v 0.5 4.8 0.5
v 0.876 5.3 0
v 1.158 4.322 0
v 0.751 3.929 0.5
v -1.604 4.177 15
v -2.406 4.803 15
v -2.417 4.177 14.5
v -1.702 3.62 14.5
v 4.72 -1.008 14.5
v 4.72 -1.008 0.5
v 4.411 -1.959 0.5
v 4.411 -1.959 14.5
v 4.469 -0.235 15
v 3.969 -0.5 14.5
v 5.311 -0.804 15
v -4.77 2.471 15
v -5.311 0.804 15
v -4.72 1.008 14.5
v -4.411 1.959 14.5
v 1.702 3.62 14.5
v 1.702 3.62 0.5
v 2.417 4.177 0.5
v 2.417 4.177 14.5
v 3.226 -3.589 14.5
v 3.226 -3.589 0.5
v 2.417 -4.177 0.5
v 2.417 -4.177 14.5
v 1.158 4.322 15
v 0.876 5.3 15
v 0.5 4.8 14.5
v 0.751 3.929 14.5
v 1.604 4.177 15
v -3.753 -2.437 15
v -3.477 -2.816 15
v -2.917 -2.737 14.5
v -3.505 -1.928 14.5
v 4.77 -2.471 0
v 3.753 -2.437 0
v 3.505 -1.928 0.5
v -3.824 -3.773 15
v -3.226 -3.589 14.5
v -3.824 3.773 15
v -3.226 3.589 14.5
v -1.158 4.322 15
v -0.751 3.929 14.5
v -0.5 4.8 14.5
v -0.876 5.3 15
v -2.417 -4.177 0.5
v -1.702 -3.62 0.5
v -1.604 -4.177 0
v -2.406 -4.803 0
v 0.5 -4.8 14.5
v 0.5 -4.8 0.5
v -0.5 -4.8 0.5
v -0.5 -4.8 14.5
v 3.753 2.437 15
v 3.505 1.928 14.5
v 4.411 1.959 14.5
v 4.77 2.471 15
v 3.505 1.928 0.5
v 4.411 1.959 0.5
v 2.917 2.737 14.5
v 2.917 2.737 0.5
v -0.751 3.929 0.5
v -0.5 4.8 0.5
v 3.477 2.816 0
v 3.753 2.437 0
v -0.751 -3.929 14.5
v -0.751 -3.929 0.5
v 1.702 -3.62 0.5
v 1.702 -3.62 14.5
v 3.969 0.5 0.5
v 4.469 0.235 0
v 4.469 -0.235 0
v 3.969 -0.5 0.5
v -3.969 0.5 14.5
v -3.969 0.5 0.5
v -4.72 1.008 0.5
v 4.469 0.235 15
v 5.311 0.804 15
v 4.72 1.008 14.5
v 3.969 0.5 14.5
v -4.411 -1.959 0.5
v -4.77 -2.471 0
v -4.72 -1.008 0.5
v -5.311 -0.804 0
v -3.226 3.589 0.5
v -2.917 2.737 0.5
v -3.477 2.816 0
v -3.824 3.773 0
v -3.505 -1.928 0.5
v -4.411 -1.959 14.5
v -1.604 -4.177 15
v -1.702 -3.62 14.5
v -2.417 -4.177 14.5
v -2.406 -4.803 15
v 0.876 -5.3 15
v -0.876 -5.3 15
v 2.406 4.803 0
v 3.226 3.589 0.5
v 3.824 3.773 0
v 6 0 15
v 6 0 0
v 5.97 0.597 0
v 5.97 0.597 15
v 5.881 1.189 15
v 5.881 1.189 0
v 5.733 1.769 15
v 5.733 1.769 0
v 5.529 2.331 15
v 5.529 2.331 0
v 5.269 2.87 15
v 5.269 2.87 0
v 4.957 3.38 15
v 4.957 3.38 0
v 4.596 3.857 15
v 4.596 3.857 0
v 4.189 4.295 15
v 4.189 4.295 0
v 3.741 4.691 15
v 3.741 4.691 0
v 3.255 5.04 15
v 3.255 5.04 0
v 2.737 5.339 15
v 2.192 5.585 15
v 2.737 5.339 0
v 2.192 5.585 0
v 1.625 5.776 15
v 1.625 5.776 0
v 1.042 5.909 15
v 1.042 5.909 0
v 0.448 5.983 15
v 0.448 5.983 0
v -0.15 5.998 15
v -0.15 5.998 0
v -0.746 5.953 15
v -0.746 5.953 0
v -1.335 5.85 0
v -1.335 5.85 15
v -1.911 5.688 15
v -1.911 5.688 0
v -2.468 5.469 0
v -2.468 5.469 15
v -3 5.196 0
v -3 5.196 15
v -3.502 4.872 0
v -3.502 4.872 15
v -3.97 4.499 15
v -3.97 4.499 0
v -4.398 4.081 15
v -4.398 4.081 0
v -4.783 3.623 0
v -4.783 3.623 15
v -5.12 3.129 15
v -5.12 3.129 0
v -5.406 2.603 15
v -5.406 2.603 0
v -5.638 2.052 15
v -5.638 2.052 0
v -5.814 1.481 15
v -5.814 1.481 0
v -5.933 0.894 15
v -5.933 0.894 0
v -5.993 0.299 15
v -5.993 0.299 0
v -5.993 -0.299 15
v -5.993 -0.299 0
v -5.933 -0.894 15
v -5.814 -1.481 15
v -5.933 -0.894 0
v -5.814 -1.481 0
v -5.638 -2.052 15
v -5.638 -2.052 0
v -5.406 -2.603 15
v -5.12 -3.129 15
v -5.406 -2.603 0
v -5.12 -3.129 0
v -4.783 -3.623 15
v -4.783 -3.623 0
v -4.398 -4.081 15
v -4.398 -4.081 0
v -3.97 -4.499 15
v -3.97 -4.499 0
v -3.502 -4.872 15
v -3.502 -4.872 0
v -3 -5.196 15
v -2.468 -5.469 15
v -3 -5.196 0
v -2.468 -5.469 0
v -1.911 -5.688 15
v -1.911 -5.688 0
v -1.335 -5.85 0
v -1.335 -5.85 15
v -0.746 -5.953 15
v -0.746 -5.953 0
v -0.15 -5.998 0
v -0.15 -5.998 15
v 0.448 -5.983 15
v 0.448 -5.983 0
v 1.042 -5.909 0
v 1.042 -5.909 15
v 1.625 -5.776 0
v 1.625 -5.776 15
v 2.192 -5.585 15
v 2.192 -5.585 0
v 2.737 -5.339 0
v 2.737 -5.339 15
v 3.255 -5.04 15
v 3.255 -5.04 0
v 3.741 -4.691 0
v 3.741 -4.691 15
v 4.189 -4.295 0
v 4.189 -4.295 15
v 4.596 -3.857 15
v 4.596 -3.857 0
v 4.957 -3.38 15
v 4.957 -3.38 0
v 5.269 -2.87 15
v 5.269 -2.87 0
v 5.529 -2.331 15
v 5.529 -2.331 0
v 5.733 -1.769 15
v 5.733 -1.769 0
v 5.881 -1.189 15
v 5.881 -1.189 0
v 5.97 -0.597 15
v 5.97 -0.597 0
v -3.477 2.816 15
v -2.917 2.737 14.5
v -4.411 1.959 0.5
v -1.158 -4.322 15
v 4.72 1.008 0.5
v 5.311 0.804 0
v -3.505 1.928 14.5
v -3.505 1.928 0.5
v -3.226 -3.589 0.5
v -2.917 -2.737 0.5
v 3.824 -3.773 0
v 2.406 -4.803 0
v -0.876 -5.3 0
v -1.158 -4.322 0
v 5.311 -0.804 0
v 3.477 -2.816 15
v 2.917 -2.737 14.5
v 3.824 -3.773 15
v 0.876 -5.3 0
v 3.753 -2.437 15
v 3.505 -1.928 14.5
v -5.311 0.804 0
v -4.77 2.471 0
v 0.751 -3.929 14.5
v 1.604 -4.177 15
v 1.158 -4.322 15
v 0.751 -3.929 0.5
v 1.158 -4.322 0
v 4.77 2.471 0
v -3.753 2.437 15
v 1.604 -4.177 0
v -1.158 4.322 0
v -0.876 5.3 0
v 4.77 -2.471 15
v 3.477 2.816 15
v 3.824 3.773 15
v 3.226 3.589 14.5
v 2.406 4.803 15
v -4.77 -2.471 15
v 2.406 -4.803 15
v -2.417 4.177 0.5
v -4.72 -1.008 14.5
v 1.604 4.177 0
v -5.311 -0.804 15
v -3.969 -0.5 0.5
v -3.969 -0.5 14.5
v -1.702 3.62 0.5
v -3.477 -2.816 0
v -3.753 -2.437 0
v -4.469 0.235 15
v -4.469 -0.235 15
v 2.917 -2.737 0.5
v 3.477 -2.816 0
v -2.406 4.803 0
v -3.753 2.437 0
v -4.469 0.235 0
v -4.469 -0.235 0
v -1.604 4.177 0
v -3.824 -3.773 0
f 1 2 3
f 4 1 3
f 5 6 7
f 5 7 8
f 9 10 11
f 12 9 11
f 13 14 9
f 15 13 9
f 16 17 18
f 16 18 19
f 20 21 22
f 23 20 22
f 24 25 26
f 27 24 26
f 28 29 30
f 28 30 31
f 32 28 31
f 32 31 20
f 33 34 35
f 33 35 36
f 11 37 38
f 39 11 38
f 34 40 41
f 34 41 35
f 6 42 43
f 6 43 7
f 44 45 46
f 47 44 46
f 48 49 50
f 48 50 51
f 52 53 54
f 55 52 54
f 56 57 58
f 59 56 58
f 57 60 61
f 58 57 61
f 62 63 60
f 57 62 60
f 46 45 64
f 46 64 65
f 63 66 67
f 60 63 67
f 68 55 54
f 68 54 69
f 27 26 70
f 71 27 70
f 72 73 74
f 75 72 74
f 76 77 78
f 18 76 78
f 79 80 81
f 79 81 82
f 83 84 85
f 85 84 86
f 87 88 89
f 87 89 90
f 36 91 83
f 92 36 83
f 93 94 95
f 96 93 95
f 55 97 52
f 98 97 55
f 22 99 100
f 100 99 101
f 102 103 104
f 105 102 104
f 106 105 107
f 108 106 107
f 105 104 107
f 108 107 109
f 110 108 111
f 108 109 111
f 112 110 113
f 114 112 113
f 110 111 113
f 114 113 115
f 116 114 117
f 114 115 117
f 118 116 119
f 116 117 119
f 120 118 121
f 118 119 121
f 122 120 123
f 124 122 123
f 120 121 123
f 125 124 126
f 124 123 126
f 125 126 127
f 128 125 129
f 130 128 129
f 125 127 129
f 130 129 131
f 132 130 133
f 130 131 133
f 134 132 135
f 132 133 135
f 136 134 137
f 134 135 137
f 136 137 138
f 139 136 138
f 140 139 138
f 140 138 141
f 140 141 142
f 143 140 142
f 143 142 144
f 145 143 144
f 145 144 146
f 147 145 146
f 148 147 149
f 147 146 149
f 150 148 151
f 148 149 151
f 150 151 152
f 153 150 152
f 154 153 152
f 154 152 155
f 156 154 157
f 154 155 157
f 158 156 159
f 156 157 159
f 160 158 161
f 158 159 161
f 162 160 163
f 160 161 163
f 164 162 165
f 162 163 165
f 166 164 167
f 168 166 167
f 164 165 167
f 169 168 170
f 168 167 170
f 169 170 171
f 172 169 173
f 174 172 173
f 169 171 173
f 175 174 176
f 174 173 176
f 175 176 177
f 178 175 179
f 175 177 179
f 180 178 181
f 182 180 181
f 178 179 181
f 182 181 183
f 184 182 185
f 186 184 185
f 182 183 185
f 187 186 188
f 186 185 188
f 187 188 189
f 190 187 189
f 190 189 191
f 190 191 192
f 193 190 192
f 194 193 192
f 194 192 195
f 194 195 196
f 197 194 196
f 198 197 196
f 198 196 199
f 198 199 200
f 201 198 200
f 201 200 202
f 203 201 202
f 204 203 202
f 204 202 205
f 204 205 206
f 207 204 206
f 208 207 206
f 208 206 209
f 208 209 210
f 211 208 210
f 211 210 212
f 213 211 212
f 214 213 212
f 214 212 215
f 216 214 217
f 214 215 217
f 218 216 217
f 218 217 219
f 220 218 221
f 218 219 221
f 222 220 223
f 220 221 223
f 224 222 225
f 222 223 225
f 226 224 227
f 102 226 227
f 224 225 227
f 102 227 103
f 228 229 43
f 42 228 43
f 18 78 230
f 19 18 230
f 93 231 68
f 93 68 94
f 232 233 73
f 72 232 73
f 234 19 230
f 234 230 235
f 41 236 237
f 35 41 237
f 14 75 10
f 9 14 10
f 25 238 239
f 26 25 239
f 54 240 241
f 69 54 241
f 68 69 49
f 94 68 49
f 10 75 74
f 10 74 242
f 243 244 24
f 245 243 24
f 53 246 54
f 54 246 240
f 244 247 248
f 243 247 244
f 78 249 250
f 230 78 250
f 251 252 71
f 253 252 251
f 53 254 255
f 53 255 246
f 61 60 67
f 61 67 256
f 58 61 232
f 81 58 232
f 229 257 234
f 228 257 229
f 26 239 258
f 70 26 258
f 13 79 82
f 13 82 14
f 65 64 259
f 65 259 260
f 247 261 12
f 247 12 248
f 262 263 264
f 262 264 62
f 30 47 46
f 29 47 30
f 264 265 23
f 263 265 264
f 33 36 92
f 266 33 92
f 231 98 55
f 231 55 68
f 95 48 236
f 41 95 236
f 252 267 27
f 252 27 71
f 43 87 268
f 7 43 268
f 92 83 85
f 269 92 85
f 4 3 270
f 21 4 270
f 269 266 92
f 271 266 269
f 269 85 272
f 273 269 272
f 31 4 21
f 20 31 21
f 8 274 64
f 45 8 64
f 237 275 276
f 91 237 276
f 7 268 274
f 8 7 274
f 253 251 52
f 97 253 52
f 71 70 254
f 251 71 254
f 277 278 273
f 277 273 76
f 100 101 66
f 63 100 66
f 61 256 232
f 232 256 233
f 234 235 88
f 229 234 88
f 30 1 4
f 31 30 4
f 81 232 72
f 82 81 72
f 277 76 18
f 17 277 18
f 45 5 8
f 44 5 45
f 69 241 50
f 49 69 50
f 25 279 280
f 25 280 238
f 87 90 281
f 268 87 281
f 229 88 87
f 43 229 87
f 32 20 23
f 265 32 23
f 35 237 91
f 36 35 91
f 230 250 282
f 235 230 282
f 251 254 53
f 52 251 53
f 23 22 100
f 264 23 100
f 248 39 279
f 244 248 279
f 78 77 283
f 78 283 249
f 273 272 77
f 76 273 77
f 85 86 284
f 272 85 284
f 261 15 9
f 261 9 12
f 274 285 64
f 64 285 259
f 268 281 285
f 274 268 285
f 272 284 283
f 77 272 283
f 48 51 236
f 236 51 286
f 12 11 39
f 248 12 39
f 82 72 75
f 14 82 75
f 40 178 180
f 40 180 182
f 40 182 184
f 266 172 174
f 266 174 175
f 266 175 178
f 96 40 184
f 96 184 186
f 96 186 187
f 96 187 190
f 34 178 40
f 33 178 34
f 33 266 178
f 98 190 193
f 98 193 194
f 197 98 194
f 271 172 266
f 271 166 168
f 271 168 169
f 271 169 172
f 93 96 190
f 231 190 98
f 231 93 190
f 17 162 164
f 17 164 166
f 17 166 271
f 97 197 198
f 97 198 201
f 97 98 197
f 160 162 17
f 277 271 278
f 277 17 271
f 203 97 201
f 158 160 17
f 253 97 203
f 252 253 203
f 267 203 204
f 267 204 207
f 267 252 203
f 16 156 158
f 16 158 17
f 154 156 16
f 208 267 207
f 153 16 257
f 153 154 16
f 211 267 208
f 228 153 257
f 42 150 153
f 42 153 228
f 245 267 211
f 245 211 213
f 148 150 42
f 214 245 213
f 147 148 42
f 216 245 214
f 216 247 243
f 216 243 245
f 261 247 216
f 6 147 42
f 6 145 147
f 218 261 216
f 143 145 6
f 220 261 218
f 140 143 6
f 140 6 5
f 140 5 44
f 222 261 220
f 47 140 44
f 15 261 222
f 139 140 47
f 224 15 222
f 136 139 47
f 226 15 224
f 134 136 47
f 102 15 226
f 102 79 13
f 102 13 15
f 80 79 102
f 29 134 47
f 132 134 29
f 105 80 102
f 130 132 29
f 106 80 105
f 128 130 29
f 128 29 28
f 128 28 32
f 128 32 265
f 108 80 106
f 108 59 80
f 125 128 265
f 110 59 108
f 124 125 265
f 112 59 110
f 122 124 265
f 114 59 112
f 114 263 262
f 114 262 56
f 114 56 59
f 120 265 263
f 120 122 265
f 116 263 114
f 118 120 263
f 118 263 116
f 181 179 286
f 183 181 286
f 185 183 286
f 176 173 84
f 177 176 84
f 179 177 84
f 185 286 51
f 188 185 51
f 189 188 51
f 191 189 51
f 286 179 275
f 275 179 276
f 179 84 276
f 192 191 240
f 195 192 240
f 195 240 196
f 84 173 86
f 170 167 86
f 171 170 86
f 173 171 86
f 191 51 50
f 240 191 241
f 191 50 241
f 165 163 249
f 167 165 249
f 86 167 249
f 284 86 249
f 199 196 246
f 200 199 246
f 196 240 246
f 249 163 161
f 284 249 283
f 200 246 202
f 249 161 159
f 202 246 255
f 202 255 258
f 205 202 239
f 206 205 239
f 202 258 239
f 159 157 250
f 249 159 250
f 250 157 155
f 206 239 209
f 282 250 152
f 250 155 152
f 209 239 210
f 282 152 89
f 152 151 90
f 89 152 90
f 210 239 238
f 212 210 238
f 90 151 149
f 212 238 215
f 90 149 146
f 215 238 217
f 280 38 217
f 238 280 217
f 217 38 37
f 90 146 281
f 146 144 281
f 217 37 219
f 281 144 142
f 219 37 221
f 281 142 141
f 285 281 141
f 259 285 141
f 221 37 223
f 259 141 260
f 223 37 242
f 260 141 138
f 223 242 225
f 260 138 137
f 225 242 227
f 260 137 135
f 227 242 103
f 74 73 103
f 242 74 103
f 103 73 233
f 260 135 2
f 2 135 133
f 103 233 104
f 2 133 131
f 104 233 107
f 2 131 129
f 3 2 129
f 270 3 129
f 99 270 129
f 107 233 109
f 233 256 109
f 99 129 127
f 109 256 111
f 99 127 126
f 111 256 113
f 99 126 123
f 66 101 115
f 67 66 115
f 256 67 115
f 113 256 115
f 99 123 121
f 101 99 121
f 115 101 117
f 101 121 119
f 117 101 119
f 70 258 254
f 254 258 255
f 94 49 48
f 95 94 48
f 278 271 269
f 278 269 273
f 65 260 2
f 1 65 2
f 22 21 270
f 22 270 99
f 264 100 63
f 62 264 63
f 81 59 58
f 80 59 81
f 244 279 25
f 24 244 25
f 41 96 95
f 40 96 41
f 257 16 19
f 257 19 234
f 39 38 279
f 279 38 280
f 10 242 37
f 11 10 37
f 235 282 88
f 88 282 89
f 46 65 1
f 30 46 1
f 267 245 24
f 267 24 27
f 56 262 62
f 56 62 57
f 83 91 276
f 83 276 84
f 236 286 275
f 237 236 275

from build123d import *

# Parameters (mm, degrees)
F0_R     = 6
F1_DEPTH = 15
F2_SIZE  = 0.5


# Not quite as in the source:
# - a feature names something its author has since deleted; it is built from what else it names


with BuildPart() as f1:
    # F0 (on Top) → F1 (new body)
    with BuildSketch(Plane.XY):
        Circle(F0_R)
        Polygon((0.5, 4.8), (0.7508449189, 3.9288970345), (1.7019014352, 3.6198800401), (2.4168607138, 4.1771741991), (3.2258777082, 3.5893889469), (2.9167940342, 2.7372089), (3.5045792865, 1.9281919056), (4.410562781, 1.9588098311), (4.7195797754, 1.0077533149), (3.9686269666, 0.5), (3.9686269666, -0.5), (4.7195797754, -1.0077533149), (4.410562781, -1.9588098311), (3.5045792865, -1.9281919056), (2.9167940342, -2.7372089), (3.2258777082, -3.5893889469), (2.4168607138, -4.1771741991), (1.7019014352, -3.6198800401), (0.7508449189, -3.9288970345), (0.5, -4.8), (-0.5, -4.8), (-0.7508449189, -3.9288970345), (-1.7019014352, -3.6198800401), (-2.4168607138, -4.1771741991), (-3.2258777082, -3.5893889469), (-2.9167940342, -2.7372089), (-3.5045792865, -1.9281919056), (-4.410562781, -1.9588098311), (-4.7195797754, -1.0077533149), (-3.9686269666, -0.5), (-3.9686269666, 0.5), (-4.7195797754, 1.0077533149), (-4.410562781, 1.9588098311), (-3.5045792865, 1.9281919056), (-2.9167940342, 2.7372089), (-3.2258777082, 3.5893889469), (-2.4168607138, 4.1771741991), (-1.7019014352, 3.6198800401), (-0.7508449189, 3.9288970345), (-0.5, 4.8), align=None, mode=Mode.SUBTRACT)
    extrude(amount=F1_DEPTH)

    # F2
    f2_edges = [f1.edges().sort_by_distance(p)[0] for p in [
        (-3.071336, -3.163299, 15),
        (-1.226373, -3.774389, 15),
        (-4.565071, -1.483282, 15),
        (-4.565071, 1.483282, 15),
        (-2.821369, -3.883282, 15),
        (-4.344103, 0.753877, 15),
        (2.821369, 3.883282, 15),
        (-0.625422, -4.364449, 15),
        (-3.210687, -2.3327, 15),
        (-3.071336, 3.163299, 15),
        (1.226373, -3.774389, 15),
        (-4.344103, -0.753877, 15),
        (2.059381, 3.898527, 15),
        (3.071336, -3.163299, 15),
        (4.565071, 1.483282, 15),
        (3.957571, 1.943501, 15),
        (3.968627, 0, 15),
        (3.071336, 3.163299, 15),
        (4.344103, 0.753877, 15),
        (2.821369, -3.883282, 15),
        (3.210687, 2.3327, 15),
        (0.625422, 4.364449, 15),
        (-2.059381, 3.898527, 15),
        (0, 4.8, 15),
        (3.957571, -1.943501, 15),
        (2.059381, -3.898527, 15),
        (-3.210687, 2.3327, 15),
        (-0.625422, 4.364449, 15),
        (0.625422, -4.364449, 15),
        (-2.059381, -3.898527, 15),
        (4.344103, -0.753877, 15),
        (3.210687, -2.3327, 15),
        (0, -4.8, 15),
        (-3.968627, 0, 15),
        (-3.957571, -1.943501, 15),
        (4.565071, -1.483282, 15),
        (-2.821369, 3.883282, 15),
        (1.226373, 3.774389, 15),
        (-3.957571, 1.943501, 15),
        (-1.226373, 3.774389, 15),
        (-2.821369, -3.883282, 0),
        (2.821369, -3.883282, 0),
        (0, -4.8, 0),
        (4.344103, -0.753877, 0),
        (1.226373, -3.774389, 0),
        (-4.344103, 0.753877, 0),
        (2.821369, 3.883282, 0),
        (-0.625422, -4.364449, 0),
        (-3.968627, 0, 0),
        (3.957571, -1.943501, 0),
        (-4.565071, -1.483282, 0),
        (-3.071336, -3.163299, 0),
        (-3.071336, 3.163299, 0),
        (-1.226373, -3.774389, 0),
        (-2.059381, 3.898527, 0),
        (-4.565071, 1.483282, 0),
        (0.625422, 4.364449, 0),
        (3.210687, 2.3327, 0),
        (3.957571, 1.943501, 0),
        (1.226373, 3.774389, 0),
        (-3.210687, 2.3327, 0),
        (3.071336, -3.163299, 0),
        (-1.226373, 3.774389, 0),
        (0.625422, -4.364449, 0),
        (-2.821369, 3.883282, 0),
        (-4.344103, -0.753877, 0),
        (-2.059381, -3.898527, 0),
        (4.344103, 0.753877, 0),
        (-0.625422, 4.364449, 0),
        (-3.210687, -2.3327, 0),
        (-3.957571, 1.943501, 0),
        (4.565071, 1.483282, 0),
        (3.968627, 0, 0),
        (2.059381, 3.898527, 0),
        (2.059381, -3.898527, 0),
        (3.210687, -2.3327, 0),
        (0, 4.8, 0),
        (4.565071, -1.483282, 0),
        (3.071336, 3.163299, 0),
        (-3.957571, -1.943501, 0),
    ]]
    chamfer(f2_edges, length=F2_SIZE)


solid = f1.part
